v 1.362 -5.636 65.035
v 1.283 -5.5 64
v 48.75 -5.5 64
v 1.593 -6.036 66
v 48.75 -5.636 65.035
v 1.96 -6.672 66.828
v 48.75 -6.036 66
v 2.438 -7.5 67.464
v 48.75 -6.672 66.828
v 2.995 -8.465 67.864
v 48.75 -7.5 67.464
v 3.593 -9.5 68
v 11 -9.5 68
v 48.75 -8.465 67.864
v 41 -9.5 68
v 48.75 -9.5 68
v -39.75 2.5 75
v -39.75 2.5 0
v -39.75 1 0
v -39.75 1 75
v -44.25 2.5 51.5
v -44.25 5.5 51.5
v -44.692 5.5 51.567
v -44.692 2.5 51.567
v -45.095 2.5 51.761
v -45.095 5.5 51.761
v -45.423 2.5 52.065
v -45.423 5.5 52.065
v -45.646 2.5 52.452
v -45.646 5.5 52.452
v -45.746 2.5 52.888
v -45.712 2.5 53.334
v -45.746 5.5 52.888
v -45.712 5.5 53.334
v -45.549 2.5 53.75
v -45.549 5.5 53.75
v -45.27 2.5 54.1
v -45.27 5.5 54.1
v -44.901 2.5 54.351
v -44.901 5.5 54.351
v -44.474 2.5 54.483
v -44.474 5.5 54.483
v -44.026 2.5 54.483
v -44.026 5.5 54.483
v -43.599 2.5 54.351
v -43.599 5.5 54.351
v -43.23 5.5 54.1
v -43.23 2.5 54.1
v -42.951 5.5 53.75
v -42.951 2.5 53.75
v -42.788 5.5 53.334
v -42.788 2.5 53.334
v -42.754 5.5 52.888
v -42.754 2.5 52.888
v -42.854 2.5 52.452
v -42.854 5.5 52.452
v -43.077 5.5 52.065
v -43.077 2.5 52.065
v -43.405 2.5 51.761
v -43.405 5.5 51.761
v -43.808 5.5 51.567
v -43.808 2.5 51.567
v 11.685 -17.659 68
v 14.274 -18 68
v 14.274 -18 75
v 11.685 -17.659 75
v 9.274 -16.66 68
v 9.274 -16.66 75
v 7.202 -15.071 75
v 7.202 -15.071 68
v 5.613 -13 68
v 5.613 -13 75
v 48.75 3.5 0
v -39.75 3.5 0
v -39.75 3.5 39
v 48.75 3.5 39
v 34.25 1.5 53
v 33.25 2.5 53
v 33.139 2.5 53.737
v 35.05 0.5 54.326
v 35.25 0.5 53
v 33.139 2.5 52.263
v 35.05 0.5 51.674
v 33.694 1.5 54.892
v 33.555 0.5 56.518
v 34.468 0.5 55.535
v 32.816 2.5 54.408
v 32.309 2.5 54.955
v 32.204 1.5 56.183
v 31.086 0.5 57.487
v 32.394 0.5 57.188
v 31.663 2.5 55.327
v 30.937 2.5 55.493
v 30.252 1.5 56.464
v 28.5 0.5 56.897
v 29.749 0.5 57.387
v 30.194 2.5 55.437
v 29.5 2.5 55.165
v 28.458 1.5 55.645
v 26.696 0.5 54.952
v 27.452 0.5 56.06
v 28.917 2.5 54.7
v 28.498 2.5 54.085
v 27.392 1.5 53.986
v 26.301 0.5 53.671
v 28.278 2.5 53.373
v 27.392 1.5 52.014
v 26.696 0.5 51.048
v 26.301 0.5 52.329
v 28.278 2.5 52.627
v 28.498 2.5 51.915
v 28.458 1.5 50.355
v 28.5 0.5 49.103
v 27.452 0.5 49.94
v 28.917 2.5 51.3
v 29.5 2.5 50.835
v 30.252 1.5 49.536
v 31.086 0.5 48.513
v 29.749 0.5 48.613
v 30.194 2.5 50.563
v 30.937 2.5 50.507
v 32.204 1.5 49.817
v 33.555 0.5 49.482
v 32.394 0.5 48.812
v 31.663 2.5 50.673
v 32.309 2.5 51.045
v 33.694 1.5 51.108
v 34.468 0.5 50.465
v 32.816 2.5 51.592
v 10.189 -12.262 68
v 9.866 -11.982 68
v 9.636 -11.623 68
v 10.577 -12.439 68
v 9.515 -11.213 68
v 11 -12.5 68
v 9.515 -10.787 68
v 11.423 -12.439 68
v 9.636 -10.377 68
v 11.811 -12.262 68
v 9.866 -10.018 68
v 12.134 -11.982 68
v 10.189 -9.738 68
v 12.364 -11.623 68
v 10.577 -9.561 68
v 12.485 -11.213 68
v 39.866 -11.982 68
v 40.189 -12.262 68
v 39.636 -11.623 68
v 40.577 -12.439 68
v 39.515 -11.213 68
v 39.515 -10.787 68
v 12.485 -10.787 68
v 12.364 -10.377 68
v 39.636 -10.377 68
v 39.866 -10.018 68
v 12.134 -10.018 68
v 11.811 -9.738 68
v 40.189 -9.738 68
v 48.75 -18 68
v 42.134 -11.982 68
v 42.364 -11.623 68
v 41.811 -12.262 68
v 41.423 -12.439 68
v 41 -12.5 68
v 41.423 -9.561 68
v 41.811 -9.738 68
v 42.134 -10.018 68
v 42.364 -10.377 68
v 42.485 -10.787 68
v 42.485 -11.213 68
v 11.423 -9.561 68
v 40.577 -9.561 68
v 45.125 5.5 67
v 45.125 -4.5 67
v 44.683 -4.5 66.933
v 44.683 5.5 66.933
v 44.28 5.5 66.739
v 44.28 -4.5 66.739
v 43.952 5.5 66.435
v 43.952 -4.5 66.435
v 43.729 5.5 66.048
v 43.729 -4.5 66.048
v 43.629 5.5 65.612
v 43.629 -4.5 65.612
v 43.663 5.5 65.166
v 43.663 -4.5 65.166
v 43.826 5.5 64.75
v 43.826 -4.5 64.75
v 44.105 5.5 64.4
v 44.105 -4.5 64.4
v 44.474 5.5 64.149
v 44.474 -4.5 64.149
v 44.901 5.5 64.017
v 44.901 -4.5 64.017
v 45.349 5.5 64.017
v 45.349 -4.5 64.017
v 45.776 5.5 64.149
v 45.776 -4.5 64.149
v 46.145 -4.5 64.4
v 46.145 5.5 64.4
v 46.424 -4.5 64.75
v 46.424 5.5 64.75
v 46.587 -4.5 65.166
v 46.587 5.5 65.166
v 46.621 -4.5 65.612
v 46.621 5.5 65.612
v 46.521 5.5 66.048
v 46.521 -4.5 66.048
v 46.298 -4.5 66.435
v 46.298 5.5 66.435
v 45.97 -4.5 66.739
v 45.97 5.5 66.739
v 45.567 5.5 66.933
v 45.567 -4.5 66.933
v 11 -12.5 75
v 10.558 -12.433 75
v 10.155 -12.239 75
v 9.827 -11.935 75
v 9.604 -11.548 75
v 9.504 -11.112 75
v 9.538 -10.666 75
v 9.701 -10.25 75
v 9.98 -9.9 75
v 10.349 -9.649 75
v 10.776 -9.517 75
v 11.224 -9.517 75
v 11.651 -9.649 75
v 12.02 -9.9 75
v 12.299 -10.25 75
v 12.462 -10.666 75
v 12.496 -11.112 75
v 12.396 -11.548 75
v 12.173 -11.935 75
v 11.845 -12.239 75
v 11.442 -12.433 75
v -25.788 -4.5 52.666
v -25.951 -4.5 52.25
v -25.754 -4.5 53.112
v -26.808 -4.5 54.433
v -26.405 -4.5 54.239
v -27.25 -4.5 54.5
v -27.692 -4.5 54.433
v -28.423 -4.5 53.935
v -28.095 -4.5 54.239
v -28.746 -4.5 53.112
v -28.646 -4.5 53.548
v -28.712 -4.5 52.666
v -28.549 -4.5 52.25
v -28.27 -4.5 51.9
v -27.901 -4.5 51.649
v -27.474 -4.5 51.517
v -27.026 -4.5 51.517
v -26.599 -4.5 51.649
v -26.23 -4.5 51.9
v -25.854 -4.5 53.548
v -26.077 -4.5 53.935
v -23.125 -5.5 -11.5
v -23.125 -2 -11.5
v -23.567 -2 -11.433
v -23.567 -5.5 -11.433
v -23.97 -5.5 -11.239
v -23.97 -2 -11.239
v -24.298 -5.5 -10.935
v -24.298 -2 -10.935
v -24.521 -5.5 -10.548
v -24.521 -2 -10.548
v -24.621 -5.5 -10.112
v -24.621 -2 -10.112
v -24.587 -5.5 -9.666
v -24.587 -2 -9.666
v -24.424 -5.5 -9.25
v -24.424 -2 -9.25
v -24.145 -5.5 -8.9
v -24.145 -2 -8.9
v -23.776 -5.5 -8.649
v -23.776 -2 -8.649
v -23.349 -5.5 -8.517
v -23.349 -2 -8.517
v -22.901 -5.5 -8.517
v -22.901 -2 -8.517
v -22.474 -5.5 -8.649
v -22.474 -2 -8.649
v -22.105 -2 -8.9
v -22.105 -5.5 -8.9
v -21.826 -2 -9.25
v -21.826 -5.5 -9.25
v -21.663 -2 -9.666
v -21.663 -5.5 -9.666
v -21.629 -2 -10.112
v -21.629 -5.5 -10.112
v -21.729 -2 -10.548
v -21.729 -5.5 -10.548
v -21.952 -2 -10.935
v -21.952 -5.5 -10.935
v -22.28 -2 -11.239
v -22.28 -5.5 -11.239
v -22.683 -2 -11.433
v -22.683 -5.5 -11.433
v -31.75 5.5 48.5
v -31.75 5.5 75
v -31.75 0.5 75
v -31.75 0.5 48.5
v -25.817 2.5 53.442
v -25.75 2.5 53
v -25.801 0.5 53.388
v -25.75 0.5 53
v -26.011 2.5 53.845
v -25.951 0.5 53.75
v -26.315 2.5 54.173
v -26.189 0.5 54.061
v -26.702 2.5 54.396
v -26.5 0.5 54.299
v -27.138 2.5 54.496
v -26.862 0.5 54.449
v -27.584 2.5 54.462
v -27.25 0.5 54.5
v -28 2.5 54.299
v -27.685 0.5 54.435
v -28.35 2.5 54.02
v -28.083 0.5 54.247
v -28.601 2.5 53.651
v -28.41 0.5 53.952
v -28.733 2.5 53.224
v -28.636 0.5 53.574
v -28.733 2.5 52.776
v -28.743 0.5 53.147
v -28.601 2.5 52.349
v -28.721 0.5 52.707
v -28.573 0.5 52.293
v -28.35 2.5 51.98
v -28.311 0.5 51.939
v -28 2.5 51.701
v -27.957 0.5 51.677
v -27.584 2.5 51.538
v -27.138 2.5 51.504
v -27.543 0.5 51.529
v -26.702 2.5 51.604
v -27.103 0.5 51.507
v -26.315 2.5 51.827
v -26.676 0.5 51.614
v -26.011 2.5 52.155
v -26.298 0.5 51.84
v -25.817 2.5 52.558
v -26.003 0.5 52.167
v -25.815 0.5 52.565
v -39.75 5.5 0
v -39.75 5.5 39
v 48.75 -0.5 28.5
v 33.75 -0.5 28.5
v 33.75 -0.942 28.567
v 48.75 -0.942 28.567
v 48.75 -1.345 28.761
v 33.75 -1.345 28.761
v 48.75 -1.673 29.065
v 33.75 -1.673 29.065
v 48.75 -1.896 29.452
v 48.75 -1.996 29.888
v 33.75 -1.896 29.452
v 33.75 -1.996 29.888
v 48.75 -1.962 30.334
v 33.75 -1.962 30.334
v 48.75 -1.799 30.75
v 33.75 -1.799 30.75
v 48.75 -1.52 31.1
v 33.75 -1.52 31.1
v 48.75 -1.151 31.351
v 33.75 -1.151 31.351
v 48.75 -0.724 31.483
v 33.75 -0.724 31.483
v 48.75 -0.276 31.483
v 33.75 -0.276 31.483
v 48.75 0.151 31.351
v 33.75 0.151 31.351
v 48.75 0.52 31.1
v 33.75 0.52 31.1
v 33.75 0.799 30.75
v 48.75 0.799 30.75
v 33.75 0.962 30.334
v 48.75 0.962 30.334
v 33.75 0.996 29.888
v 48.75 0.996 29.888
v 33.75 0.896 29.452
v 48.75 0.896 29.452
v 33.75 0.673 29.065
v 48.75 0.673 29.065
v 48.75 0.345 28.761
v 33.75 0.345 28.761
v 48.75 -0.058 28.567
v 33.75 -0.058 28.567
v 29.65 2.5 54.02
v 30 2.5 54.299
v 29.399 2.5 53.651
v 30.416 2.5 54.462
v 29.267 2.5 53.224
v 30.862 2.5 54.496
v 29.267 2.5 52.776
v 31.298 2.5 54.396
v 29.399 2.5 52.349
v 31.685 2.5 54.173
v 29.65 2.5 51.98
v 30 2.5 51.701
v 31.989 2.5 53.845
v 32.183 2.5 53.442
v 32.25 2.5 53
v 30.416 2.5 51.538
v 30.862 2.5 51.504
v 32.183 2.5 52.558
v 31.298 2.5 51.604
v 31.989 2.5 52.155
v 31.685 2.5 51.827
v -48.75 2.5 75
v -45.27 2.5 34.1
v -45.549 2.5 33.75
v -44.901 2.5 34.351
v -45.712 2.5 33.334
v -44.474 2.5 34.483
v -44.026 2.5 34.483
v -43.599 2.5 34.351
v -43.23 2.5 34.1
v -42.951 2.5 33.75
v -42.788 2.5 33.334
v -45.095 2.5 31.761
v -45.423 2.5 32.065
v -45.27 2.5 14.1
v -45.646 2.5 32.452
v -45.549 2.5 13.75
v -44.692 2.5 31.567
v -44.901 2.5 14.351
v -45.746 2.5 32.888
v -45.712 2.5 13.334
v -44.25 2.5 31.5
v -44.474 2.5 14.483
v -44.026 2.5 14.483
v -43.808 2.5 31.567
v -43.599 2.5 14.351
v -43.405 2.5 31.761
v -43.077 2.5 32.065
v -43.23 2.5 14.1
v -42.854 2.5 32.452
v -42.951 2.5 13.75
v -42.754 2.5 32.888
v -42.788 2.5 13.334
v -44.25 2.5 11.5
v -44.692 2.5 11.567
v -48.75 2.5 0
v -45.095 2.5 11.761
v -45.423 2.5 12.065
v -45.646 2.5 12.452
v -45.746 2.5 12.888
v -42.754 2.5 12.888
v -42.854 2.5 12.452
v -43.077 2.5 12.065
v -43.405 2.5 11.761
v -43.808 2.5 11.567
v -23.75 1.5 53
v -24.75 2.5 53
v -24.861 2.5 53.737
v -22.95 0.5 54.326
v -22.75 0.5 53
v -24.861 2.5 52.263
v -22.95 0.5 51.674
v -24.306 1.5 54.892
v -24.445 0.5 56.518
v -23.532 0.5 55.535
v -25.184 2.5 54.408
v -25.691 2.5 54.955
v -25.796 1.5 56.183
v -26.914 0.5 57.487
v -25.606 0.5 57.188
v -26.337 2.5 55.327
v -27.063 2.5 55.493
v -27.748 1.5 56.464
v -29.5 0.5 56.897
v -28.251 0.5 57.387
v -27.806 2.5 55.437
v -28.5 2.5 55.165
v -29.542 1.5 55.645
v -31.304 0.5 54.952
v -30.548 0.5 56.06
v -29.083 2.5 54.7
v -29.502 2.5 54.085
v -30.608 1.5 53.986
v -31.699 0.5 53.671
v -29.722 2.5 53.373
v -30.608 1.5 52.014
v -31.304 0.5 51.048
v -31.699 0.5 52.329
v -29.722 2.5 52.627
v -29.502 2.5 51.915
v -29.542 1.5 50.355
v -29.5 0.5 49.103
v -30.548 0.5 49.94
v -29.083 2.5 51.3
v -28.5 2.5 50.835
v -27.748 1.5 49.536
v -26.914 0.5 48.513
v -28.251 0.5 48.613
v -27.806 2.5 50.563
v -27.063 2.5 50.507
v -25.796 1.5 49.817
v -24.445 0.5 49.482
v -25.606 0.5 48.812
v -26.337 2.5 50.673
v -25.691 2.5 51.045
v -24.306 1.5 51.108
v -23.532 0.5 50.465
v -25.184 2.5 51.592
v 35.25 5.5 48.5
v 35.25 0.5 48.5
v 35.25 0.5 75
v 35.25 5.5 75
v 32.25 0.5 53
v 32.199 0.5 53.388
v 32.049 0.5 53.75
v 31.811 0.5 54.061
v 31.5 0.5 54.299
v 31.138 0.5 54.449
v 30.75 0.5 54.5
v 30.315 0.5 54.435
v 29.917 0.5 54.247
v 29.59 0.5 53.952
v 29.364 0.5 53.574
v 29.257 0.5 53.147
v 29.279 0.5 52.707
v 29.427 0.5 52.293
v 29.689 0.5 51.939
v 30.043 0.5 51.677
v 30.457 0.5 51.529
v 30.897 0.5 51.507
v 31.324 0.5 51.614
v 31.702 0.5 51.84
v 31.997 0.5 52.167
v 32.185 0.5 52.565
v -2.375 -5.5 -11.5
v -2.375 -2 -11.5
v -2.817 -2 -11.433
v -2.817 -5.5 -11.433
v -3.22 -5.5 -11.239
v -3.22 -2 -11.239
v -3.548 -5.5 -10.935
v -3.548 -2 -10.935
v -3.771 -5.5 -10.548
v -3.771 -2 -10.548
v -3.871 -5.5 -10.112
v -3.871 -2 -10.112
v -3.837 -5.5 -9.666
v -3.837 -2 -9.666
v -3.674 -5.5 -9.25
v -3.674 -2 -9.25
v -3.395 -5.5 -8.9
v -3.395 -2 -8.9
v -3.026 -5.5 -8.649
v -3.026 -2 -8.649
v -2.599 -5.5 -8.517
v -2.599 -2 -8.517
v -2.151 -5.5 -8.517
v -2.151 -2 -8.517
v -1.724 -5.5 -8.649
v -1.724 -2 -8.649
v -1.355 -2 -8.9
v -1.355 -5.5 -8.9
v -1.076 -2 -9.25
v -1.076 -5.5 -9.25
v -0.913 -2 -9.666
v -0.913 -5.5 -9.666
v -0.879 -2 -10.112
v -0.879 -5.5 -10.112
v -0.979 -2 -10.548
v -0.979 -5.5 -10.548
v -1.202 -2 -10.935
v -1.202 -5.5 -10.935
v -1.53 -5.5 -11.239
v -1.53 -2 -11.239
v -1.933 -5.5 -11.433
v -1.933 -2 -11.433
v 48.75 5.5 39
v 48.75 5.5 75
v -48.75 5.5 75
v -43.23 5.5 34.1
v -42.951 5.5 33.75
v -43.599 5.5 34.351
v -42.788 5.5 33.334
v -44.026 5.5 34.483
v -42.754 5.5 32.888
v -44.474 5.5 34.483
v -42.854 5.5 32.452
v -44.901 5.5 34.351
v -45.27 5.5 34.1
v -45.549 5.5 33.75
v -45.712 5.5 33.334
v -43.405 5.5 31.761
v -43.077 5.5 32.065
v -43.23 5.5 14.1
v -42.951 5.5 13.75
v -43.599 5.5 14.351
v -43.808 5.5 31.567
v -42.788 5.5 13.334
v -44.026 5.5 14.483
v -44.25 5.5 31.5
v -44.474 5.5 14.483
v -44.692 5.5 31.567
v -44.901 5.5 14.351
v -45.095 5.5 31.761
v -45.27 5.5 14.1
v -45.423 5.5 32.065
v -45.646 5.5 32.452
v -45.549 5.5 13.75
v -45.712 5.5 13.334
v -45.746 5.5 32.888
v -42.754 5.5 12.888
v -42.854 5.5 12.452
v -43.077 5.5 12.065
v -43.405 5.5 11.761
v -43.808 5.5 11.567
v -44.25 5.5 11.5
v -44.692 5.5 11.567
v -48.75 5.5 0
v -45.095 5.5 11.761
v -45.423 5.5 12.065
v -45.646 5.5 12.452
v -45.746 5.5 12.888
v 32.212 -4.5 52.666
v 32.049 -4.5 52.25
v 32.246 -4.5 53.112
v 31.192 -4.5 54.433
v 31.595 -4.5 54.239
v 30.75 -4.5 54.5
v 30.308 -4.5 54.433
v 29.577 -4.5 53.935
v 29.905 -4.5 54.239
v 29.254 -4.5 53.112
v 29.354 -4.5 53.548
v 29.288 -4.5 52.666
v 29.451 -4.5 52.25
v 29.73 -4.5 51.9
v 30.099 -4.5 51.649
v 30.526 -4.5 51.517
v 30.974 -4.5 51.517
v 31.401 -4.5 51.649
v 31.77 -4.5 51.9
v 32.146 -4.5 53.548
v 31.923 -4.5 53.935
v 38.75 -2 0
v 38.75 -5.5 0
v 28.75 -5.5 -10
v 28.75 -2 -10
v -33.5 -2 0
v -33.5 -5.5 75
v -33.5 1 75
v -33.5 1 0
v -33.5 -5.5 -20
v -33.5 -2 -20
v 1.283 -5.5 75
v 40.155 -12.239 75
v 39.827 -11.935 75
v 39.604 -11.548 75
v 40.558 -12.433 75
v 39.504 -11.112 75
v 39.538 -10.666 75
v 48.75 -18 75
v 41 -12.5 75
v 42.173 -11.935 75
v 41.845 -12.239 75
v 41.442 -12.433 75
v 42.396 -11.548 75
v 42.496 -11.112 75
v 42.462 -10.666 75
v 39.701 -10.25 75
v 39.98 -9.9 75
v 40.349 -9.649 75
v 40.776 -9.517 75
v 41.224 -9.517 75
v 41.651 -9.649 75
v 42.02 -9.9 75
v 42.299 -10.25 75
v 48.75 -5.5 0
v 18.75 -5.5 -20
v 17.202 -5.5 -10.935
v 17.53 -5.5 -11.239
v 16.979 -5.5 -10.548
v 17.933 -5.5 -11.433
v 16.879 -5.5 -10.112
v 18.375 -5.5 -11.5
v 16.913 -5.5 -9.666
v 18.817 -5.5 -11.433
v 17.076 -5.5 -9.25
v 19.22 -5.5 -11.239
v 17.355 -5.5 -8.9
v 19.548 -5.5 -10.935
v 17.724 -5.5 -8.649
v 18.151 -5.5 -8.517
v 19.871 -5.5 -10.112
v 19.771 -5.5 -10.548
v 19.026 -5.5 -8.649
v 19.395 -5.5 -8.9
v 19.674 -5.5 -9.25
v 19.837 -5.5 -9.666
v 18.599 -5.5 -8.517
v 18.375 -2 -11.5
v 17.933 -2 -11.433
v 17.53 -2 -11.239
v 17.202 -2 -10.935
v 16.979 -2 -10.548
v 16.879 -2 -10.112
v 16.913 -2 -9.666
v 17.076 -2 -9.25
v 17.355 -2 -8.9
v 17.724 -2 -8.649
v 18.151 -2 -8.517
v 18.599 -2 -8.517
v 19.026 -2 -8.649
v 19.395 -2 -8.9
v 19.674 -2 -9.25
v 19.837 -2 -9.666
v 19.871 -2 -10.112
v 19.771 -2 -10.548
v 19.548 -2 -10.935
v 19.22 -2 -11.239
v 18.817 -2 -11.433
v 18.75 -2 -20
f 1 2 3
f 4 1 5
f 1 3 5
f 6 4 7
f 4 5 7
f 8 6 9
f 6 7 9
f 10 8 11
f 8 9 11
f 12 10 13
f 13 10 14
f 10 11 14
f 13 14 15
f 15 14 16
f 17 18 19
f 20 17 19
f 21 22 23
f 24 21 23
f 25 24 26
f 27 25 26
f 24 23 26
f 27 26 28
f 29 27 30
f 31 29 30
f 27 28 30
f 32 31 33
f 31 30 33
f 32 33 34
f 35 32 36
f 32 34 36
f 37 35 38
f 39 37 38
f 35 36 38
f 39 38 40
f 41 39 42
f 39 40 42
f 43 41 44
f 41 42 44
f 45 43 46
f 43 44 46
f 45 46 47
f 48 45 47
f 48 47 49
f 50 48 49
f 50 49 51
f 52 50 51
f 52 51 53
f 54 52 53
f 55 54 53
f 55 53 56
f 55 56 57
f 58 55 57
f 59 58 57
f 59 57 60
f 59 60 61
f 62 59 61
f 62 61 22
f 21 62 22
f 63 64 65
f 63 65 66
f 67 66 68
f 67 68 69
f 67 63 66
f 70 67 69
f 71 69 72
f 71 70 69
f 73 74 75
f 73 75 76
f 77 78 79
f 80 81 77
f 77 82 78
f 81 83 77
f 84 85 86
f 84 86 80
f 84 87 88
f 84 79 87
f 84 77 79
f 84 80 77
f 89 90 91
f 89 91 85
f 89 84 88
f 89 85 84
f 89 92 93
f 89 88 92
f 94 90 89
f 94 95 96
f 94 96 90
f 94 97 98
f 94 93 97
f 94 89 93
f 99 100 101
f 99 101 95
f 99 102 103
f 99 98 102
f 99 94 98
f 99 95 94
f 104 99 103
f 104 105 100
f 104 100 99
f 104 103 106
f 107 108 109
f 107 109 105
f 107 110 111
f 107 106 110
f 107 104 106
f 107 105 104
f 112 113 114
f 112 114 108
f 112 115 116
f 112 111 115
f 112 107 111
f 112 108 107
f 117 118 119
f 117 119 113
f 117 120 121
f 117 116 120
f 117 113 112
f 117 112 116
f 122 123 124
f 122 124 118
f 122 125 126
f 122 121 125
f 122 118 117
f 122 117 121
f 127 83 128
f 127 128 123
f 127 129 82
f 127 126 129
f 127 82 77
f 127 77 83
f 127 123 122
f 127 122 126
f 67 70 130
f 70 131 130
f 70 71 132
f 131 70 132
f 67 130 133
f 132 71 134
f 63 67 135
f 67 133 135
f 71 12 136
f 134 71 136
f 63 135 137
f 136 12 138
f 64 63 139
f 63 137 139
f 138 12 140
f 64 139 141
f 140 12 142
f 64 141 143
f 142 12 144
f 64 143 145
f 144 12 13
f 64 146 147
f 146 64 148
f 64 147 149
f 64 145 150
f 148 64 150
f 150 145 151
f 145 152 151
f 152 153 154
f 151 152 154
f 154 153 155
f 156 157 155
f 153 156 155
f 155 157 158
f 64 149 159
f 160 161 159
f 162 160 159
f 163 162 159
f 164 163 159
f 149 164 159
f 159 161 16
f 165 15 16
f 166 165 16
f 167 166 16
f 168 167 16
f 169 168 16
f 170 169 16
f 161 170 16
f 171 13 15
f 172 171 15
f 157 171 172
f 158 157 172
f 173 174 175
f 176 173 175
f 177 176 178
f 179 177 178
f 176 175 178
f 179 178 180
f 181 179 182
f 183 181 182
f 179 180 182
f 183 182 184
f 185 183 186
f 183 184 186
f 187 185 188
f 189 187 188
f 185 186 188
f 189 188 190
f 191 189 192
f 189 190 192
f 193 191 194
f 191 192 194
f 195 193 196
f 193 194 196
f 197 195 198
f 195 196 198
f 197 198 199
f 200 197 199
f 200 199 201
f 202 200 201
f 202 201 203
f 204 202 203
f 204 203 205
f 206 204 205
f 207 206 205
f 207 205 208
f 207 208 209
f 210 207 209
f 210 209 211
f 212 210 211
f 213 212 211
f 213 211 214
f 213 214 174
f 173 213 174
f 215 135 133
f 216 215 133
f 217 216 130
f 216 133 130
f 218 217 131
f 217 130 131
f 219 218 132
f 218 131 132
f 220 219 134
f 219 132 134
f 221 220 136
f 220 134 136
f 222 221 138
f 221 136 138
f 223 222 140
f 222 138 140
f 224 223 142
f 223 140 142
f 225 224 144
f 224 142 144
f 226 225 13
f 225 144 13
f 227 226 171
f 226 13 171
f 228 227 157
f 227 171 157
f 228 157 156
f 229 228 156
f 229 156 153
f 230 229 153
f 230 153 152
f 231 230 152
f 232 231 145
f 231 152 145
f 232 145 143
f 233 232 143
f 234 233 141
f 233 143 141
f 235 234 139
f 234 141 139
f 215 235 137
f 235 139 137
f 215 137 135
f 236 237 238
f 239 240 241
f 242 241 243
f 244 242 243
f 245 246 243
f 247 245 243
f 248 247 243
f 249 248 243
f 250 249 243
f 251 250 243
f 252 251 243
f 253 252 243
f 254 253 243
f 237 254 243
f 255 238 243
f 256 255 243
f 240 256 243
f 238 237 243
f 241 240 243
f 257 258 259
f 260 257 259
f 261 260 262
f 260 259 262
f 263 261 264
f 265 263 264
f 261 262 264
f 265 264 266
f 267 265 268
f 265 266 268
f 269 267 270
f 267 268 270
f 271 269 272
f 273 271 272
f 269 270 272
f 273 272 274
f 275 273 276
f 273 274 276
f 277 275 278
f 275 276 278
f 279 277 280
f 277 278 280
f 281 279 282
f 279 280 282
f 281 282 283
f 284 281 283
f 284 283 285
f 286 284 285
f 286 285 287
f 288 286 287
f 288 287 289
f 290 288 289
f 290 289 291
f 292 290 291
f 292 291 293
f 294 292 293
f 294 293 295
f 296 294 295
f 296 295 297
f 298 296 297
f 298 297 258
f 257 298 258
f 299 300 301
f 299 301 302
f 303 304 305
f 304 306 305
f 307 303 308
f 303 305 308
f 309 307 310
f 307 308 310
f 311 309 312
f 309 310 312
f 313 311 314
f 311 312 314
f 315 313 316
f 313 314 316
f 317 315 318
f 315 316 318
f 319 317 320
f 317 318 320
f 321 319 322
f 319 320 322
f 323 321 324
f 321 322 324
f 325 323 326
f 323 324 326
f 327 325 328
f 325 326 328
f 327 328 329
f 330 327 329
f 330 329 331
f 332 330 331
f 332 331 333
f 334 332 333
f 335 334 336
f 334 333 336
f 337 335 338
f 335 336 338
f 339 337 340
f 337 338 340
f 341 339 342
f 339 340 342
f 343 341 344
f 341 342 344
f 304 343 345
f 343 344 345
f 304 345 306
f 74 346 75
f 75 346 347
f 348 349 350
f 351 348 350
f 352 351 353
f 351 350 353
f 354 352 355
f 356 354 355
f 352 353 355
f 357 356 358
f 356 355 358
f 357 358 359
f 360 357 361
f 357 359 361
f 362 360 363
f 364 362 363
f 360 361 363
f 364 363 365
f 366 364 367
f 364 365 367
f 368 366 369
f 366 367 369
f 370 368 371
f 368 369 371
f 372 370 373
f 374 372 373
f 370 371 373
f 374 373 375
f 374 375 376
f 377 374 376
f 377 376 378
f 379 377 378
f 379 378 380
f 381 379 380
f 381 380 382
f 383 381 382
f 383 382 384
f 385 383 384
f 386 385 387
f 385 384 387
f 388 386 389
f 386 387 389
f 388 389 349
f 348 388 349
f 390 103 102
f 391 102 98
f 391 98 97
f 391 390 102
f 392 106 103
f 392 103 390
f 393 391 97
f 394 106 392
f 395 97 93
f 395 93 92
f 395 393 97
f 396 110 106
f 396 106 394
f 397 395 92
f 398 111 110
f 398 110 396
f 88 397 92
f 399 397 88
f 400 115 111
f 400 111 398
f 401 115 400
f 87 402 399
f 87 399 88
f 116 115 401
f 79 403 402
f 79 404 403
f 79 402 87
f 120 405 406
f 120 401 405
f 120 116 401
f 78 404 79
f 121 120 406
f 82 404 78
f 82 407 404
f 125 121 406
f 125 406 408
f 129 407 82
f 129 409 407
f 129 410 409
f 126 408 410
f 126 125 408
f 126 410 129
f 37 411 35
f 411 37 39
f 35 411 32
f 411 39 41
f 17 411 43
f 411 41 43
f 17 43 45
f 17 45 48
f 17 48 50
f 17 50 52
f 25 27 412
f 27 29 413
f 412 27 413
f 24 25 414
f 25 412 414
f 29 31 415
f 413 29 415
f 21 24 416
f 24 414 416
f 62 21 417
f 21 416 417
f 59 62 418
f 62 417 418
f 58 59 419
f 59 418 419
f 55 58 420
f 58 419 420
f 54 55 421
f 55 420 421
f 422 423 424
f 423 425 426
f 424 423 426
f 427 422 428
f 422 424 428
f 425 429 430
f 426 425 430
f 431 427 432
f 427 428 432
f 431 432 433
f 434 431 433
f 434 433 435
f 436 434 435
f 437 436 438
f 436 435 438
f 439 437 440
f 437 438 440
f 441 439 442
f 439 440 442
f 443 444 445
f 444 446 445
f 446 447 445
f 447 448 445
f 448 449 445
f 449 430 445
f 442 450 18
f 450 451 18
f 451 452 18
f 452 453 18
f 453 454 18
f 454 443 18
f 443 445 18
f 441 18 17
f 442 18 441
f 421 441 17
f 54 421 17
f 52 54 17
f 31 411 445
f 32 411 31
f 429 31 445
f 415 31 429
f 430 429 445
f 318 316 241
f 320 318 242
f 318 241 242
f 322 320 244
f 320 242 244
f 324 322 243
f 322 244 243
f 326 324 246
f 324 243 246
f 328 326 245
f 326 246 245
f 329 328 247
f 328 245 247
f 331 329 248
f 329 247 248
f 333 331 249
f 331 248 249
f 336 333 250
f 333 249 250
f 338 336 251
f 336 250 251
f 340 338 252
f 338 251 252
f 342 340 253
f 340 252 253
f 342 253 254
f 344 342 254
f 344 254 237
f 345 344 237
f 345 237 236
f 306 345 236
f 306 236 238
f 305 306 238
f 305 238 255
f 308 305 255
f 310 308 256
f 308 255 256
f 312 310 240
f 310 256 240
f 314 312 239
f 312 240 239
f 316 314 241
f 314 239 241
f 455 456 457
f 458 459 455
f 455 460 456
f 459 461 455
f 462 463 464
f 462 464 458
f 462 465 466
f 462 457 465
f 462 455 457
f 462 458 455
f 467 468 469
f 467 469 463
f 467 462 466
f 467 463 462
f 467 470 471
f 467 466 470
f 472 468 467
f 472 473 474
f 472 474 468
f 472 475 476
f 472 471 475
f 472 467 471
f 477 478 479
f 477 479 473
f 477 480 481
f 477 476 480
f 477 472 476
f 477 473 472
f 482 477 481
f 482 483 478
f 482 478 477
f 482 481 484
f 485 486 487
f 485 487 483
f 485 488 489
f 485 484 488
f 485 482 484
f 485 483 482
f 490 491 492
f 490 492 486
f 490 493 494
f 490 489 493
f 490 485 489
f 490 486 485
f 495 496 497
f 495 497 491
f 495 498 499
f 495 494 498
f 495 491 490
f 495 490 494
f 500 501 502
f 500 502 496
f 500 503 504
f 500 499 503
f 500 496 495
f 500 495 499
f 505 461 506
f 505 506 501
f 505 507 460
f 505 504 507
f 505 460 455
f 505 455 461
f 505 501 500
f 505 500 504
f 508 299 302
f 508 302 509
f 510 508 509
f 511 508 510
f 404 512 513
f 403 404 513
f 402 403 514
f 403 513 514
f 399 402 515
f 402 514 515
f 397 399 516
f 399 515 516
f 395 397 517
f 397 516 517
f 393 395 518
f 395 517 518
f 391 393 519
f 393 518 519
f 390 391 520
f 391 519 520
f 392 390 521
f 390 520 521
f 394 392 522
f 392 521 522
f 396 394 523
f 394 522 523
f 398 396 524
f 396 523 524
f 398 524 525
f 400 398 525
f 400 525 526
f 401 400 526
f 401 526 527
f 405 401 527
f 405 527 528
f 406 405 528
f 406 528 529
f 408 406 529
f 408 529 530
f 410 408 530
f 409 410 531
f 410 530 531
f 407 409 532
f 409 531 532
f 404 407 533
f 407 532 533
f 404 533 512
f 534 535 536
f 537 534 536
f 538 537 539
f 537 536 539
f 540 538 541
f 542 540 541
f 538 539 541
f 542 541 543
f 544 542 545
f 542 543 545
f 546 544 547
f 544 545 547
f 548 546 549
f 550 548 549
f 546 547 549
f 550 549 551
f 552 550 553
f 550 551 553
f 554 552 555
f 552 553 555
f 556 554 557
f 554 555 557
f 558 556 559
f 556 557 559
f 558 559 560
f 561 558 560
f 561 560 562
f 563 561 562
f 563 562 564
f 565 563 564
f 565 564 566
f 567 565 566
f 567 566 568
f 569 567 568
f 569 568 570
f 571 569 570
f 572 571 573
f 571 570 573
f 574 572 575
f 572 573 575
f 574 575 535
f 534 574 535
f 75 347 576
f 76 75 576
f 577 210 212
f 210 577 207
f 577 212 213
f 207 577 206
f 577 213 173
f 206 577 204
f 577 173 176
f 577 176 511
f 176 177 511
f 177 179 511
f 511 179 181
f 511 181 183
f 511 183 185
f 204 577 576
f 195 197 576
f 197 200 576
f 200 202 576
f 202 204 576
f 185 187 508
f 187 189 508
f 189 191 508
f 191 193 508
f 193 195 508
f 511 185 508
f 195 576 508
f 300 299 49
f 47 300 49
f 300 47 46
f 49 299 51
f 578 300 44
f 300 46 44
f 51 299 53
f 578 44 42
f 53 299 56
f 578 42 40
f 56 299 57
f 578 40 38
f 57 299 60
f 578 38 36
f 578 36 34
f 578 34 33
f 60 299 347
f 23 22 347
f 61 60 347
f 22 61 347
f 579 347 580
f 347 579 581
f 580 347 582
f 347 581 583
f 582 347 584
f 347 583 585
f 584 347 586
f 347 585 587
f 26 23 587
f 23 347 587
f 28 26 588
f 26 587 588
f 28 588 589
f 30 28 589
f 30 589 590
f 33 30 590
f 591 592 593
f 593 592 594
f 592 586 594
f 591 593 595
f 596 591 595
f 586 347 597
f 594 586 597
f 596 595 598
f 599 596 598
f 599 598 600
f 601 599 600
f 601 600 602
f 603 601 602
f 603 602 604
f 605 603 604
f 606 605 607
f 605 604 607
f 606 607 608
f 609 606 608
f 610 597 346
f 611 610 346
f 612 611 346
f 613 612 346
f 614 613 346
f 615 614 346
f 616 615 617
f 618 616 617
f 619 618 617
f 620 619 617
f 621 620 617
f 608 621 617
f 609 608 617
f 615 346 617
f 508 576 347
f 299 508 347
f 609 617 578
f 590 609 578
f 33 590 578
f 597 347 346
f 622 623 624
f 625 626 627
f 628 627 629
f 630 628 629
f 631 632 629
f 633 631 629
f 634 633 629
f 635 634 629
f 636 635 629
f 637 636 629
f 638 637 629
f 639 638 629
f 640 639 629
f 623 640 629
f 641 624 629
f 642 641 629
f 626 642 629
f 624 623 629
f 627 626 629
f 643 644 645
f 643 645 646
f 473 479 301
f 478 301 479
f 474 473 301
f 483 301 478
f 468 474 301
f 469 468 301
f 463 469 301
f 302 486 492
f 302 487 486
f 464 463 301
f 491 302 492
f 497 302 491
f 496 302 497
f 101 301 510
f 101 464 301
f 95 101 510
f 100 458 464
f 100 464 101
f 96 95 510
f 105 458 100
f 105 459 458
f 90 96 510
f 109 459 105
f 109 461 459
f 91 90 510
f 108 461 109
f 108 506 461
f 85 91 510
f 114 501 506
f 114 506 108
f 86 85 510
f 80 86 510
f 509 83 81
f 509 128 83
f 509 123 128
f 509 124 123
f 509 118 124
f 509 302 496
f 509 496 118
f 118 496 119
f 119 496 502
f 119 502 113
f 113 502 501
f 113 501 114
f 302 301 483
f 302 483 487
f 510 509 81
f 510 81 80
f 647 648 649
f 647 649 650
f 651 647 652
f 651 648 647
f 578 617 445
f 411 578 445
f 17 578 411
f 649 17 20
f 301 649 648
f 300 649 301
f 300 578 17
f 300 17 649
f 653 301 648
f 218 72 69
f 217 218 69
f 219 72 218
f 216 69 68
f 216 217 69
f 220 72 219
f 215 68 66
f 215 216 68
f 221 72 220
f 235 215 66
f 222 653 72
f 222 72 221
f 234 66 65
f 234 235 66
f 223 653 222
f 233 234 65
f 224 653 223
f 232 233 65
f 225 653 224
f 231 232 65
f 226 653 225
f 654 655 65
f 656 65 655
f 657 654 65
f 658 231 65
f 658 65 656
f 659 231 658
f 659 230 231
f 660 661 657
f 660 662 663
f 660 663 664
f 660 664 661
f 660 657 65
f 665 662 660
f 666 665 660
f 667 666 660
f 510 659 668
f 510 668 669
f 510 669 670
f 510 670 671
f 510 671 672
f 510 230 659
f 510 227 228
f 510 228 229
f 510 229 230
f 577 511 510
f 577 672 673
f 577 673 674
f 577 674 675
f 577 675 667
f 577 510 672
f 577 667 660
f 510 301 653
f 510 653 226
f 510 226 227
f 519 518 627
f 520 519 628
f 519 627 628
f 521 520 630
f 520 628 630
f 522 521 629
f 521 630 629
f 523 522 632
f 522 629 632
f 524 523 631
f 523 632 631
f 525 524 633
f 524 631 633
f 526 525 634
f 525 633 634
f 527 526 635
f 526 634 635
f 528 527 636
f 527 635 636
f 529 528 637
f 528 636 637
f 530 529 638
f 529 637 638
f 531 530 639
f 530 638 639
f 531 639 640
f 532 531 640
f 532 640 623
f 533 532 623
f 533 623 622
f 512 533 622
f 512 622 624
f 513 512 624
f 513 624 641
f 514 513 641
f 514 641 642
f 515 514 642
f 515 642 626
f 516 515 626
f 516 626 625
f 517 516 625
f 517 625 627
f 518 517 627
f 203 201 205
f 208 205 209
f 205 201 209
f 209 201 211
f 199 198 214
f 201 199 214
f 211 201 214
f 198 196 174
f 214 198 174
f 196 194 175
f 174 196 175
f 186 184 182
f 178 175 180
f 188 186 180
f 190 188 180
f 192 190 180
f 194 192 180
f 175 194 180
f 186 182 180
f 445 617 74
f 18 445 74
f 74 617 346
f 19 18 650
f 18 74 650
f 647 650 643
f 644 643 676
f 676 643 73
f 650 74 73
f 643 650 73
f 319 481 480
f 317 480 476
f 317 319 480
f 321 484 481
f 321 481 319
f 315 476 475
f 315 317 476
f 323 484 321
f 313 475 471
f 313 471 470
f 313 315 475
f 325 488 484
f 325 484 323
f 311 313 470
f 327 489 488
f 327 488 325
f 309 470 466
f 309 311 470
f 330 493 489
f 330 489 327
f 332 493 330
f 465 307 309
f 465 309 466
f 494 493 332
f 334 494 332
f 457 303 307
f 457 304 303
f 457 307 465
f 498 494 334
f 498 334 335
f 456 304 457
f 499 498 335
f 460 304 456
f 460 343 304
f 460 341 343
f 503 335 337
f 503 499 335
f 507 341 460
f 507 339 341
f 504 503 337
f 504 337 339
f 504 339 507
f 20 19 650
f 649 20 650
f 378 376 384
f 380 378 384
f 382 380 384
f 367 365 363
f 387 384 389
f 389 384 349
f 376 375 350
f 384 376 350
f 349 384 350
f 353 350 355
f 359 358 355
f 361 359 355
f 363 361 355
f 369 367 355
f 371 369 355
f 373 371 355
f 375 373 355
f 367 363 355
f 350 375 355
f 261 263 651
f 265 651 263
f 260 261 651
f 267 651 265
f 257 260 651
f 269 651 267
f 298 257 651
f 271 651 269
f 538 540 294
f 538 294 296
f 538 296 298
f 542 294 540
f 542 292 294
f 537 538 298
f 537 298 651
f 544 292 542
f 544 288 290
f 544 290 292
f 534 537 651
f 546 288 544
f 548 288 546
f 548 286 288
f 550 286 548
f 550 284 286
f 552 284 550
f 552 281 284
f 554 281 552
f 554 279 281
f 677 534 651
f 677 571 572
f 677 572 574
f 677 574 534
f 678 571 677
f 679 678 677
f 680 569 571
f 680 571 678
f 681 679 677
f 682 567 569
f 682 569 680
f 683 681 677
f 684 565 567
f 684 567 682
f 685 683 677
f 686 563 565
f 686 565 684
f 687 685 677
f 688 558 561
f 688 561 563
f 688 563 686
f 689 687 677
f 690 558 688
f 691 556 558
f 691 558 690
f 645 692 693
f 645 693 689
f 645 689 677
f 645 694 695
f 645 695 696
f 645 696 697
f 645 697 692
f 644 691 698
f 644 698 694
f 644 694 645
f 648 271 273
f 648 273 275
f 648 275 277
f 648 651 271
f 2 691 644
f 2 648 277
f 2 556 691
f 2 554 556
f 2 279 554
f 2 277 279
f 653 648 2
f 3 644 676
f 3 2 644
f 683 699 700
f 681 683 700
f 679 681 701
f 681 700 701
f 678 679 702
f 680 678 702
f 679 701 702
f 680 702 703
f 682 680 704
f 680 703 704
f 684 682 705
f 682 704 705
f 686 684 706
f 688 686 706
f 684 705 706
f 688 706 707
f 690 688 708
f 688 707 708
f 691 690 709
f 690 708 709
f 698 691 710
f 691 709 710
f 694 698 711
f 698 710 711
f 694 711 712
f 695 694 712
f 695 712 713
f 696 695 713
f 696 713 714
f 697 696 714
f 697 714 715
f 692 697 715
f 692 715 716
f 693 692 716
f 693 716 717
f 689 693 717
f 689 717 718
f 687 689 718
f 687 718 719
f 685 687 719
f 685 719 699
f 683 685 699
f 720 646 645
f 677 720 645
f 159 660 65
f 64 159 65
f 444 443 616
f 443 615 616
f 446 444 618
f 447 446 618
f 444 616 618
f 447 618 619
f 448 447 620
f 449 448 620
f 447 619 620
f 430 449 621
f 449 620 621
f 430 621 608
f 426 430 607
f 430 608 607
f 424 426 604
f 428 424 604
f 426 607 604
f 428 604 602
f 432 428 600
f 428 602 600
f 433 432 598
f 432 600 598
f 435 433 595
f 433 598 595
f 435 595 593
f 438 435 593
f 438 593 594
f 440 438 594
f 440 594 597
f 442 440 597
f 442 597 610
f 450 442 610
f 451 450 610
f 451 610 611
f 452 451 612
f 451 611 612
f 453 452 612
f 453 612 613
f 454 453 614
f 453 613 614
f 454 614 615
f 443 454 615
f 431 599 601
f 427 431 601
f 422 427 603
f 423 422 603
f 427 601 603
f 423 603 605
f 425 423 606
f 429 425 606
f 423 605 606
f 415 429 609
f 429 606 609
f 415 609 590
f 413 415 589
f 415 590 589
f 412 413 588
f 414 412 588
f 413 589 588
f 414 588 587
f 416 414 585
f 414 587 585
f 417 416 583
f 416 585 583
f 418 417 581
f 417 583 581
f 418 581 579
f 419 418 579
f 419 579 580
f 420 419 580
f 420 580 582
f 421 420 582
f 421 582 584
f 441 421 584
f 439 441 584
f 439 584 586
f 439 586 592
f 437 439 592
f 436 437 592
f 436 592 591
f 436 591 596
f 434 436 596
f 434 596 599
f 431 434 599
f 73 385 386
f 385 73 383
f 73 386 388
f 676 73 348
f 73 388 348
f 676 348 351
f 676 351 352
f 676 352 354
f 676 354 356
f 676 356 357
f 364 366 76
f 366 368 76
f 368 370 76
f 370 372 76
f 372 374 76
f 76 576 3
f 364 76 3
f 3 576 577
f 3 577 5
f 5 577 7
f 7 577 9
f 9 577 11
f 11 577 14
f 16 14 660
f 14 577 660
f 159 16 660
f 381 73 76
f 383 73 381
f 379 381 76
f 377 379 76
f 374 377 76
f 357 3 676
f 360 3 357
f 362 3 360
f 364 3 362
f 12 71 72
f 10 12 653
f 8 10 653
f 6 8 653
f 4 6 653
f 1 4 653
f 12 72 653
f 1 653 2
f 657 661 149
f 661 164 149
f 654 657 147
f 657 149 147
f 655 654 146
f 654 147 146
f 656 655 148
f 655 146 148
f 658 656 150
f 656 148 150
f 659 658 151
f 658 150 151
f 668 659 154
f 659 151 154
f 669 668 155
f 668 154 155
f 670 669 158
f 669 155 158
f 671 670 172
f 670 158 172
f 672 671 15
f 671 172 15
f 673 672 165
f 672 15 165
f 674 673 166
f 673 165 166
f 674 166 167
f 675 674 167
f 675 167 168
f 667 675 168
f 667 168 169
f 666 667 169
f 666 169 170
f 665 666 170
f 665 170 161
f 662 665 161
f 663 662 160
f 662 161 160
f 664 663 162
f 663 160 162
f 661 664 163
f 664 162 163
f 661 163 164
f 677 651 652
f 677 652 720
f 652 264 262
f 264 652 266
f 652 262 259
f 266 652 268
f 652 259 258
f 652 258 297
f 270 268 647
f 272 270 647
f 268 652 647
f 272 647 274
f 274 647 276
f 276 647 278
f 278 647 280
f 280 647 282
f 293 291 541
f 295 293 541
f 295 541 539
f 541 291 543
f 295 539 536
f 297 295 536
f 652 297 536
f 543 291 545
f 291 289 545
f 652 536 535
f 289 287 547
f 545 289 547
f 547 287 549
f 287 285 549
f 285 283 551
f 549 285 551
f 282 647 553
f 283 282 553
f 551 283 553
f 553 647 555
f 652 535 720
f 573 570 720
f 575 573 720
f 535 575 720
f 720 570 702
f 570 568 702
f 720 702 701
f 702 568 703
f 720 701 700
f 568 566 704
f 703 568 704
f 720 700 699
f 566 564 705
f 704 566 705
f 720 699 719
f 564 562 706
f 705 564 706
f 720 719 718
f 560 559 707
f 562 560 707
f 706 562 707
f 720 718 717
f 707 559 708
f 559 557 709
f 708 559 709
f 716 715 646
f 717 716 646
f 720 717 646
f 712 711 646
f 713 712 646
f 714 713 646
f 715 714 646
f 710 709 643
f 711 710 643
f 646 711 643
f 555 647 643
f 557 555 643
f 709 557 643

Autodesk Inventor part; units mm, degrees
ref_plane "YZ Plane" through (0, 0, 0) normal (1, 0, 0) x (0, 1, 0)
ref_plane "XZ Plane" through (0, 0, 0) normal (0, 1, 0) x (-1, 0, 0)
ref_plane "XY Plane" through (0, 0, 0) normal (0, 0, 1) x (1, 0, 0)
sketch "Sketch1" plane through (0, 0, 0) normal (0, 0, 1) x (1, 0, 0)
  line L0 (-48.75, -5.5) -> (48.75, -5.5)
  line L1 (48.75, -5.5) -> (48.75, 5.5)
  line L2 (48.75, 5.5) -> (-48.75, 5.5)
  line L3 (-48.75, 5.5) -> (-48.75, -5.5)
  line L4 (-48.75, -5.5) -> (48.75, 5.5) construction
  line L5 (48.75, -5.5) -> (-48.75, 5.5) construction
  line L6 (-48.75, 2.5) -> (-39.75, 2.5)
  line L7 (-39.75, 2.5) -> (-39.75, 1)
  line L8 (-39.75, 1) -> (-33.5, 1)
  line L9 (-33.5, 1) -> (-33.5, -5.5)
  point P0 (0, 0)
  dimension "d0" = 11
  dimension "d1" = 97.5
  dimension "d2" = 9
  dimension "d3" = 6.25
  dimension "d4" = 1.5
  dimension "d5" = 6.5
extrude "Extrusion1" add sketch "Sketch1" along normal blind 75 contours L9 L8 L7 L6 L3 L2 L1 L0
sketch "Sketch2" plane through (-48.75, 2.5, 0) normal (0, -1, 0) x (1, 0, 0)
  line L0 (0, 0) -> (9, 0) projected
  point P0 (48.75, 0)
  point P1 (4.5, 13)
  point P2 (4.5, 33)
  point P3 (4.5, 53)
  point P4 (4.5, 0)
  point P5 (4.5, 0)
  point P6 (4.5, 73)
  dimension "d8" = 13
  dimension "d9" = 20
  dimension "d10" = 20
  dimension "d11" = 20
hole "Hole1" at (-44.25, 2.5, 13) at (-44.25, 2.5, 33) at (-44.25, 2.5, 53) direction (0, 1, 0) diameter 3 depth 15
sketch "Sketch3" plane through (48.75, -5.5, 0) normal (1, 0, 0) x (0, 0, -1)
  line L0 (0, 0) -> (0, 11) projected
  line L1 (0, 11) -> (-75, 11) projected
  line L2 (-75, 0) -> (-75, 11) projected
  line L3 (0, 0) -> (-75, 0) projected
  point P0 (0, 5.5)
  point P1 (-30, 5)
  point P2 (0, 5.5)
  dimension "d19" = 30
  dimension "d20" = 5
hole "Hole2" at (48.75, -0.5, 30) direction (-1, 0, 0) diameter 3 depth 15
sketch "Sketch4" plane through (-33.5, -5.5, 0) normal (0, -1, 0) x (1, 0, 0)
  line L0 (0, 0) -> (82.25, 0) projected
  line L1 (82.25, 0) -> (82.25, 75) projected
  line L2 (0, 75) -> (82.25, 75) projected
  line L3 (0, 0) -> (0, 75) projected
  line L4 (0, 0) -> (0, -20)
  line L5 (0, -20) -> (62.25, -20)
  line L6 (62.25, -20) -> (62.25, 0)
  point P0 (33.5, 0)
  dimension "d28" = 20
  dimension "d29" = 20
extrude "Extrusion2" add sketch "Sketch4" against normal blind 3.5 contours L0 L6 L5 L4
chamfer "Chamfer1" distance 10 angle 45 2 edges at (28.75, -3.75, -20) (28.75, -3.75, 0)
sketch "Sketch5" plane through (-33.5, -5.5, 75) normal (0, -1, 0) x (1, 0, 0)
  line L0 (0, -95) -> (0, 0) projected
  line L1 (0, -95) -> (52.25, -95) projected
  line L2 (62.25, -75) -> (0, -75) projected
  line L3 (62.25, -75) -> (62.25, -95)
  line L4 (62.25, -95) -> (52.25, -95)
  point P0 (33.5, -75)
  point P1 (10.375, -85)
  point P2 (31.125, -85)
  point P3 (51.875, -85)
  dimension "d36" = 10.375
  dimension "d37" = 20.75
  dimension "d38" = 20.75
  dimension "d39" = 20
  dimension "d40" = 10
hole "Hole3" at (-23.125, -5.5, -10) at (-2.375, -5.5, -10) at (18.375, -5.5, -10) direction (0, 1, 0) diameter 3 depth 15
sketch "Sketch6" plane through (0, 0, 75) normal (0, 0, 1) x (1, 0, 0)
  line L0 (-33.5, -5.5) -> (48.75, -5.5) projected
  line L1 (48.75, -5.5) -> (48.75, -18)
  line L2 (48.75, -18) -> (8.5, -18)
  line L3 (8.5, -18) -> (-56.5, 94.5833)
  line L4 (-56.5, 94.5833) -> (-56.5, 62)
  point P0 (0, 0)
  point P1 (48.75, -11.75)
  point P2 (1.2831, -5.5)
  dimension "d48" = 12.5
  dimension "d49" = 120
  dimension "d50" = 105.25
  dimension "d51" = 80
  dimension "d52" = 65
extrude "Extrusion3" add sketch "Sketch6" against normal blind 7
fillet "Fillet1" radius 4 1 edges at (25.0166, -5.5, 68)
fillet "Fillet2" radius 10 1 edges at (8.5, -18, 71.5)
sketch "Sketch7" plane through (0, 0, 75) normal (0, 0, 1) x (1, 0, 0)
  arc A0 (5.6132, -13) -> (14.2735, -18) centre (14.2735, -8) ccw projected
  line L0 (14.2735, -18) -> (48.75, -18) projected
  line L1 (48.75, -18) -> (48.75, 5.5) projected
  line L2 (48.75, 5.5) -> (-48.75, 5.5) projected
  line L3 (-48.75, 5.5) -> (-48.75, 2.5) projected
  line L4 (-48.75, 2.5) -> (-39.75, 2.5) projected
  line L5 (-39.75, 2.5) -> (-39.75, 1) projected
  line L6 (-39.75, 1) -> (-33.5, 1) projected
  line L7 (-33.5, 1) -> (-33.5, -5.5) projected
  line L8 (-33.5, -5.5) -> (1.2831, -5.5) projected
  line L9 (1.2831, -5.5) -> (5.6132, -13) projected
  point P0 (0, 0)
  point P1 (41, -11)
  point P2 (11, -11)
  dimension "d57" = 30
  dimension "d58" = 7.75
  dimension "d59" = 7
hole "Hole4" at (41, -11, 75) at (11, -11, 75) direction (0, 0, -1) diameter 3 depth 15
sketch "Sketch8" plane through (-48.75, 5.5, 0) normal (0, 1, 0) x (1, 0, 0)
  line L0 (97.5, -75) -> (0, -75) projected
  line L1 (97.5, 0) -> (97.5, -75) projected
  point P0 (48.75, 0)
  point P1 (93.875, -65.5)
  dimension "d67" = 9.5
  dimension "d68" = 3.625
hole "Hole5" at (45.125, 5.5, 65.5) direction (0, -1, 0) diameter 3 depth 10
sketch "Sketch9" plane through (-48.75, 5.5, 0) normal (0, 1, 0) x (1, 0, 0)
  line L0 (18, -79.5) -> (83, -79.5)
  line L1 (83, -79.5) -> (83, -49.5)
  line L2 (83, -49.5) -> (18, -49.5)
  line L3 (18, -49.5) -> (18, -79.5)
  line L4 (18, -79.5) -> (83, -49.5) construction
  line L5 (83, -79.5) -> (18, -49.5) construction
  line L6 (21.5, -76) -> (79.5, -76)
  line L7 (79.5, -76) -> (79.5, -53)
  line L8 (79.5, -53) -> (21.5, -53)
  line L9 (21.5, -53) -> (21.5, -76)
  line L10 (21.5, -76) -> (79.5, -53) construction
  line L11 (79.5, -76) -> (21.5, -53) construction
  line L12 (97.5, -75) -> (0, -75) projected
  line L13 (97.5, 0) -> (97.5, -75) projected
  line L14 (17, -48.5) -> (84, -48.5)
  line L15 (84, -48.5) -> (84, -80.5)
  line L16 (84, -80.5) -> (17, -80.5)
  line L17 (17, -80.5) -> (17, -48.5)
  point P0 (48.75, 0)
  point P1 (50.5, -64.5)
  point P2 (83, -75)
  point P3 (84, -75)
  point P4 (17, -75)
  point P5 (18, -75)
  dimension "d76" = 65
  dimension "d77" = 30
  dimension "d78" = 58
  dimension "d79" = 23
  dimension "d80" = 47
  dimension "d97" = 4.5
  dimension "d103" = 1
extrude "Extrusion4" cut sketch "Sketch9" against normal blind 5 contours L3 L12 L9 L6 L7 L1 L0 | L12 L17 L14 L15 L1 L2 L3 | L3 L2 L1 L12 L7 L8 L9 | L12 L7 L6 L9 | L9 L8 L7 L12
hole "Hole6" at (30.75, 5.5, 53) at (-27.25, 5.5, 53) direction (0, -1, 0) diameter 3 depth 10
sketch "Sketch10" plane through (-48.75, 0.5, 0) normal (0, 1, 0) x (1, 0, 0)
  circle A0 centre (21.5, -53) radius 1.5 projected
  circle A1 centre (79.5, -53) radius 1.5 projected
  line L0 (84, -75) -> (17, -75) projected
  circle A2 centre (21.5, -53) radius 2.5
  circle A3 centre (79.5, -53) radius 2.5
  circle A4 centre (76.5, -76) radius 2.5
  circle A5 centre (18.5, -76) radius 2.5
  line L1 (84, -48.5) -> (84, -75) projected
  line L2 (17, -48.5) -> (84, -48.5) projected
  line L3 (17, -75) -> (17, -48.5) projected
  point P0 (48.75, 0)
  point P1 (78.7913, -75)
  point P2 (74.2087, -75)
  point P3 (20.7913, -75)
  point P4 (20.7913, -75)
  dimension "d91" = 1
extrude "Extrusion5" add sketch "Sketch10" along normal blind 2 contours A2 | A3
chamfer "Chamfer2" distance 2 angle 45 2 edges at (28.25, 0.5, 53) (-29.75, 0.5, 53)
sketch "Sketch11" plane through (-48.75, 5.5, 0) normal (0, 1, 0) x (1, 0, 0)
  line L0 (97.5, -75) -> (84, -75) projected
  line L1 (97.5, 0) -> (97.5, -75) projected
  line L2 (97.5, 0) -> (0, 0) projected
  line L3 (0, 0) -> (0, -75) projected
  line L4 (17, -75) -> (0, -75) projected
  circle A0 centre (93.875, -65.5) radius 1.5 projected
  circle A1 centre (4.5, -53) radius 1.5 projected
  circle A2 centre (4.5, -33) radius 1.5 projected
  circle A3 centre (4.5, -13) radius 1.5 projected
  line L5 (9, 0.062) -> (9, -75.3378)
  line L6 (0, -39) -> (97.5, -39)
  line L7 (84, -48.5) -> (84, -75) projected
  line L8 (17, -75) -> (17, -48.5) projected
  line L9 (17, -48.5) -> (84, -48.5) projected
  point P0 (48.75, 0)
  point P1 (90.75, -75)
  point P2 (9, -39)
  point P3 (9, 0)
  dimension "d99" = 9
  dimension "d100" = 36
extrude "Extrusion6" cut sketch "Sketch11" against normal blind 2 contours L6 L5 L2 L1
equation "\"d10\" = d9"
equation "\"d11\" = d10"
equation "\"d36\" = 0.166667 * d35"
equation "\"d37\" = 2 * d36"
equation "\"d38\" = d37"
equation "\"d40\" = 0.5 * d39"
equation "\"d35\" = 62.25"
properties part number "BottomSlideMountExtension" material "ABS Plastic"
